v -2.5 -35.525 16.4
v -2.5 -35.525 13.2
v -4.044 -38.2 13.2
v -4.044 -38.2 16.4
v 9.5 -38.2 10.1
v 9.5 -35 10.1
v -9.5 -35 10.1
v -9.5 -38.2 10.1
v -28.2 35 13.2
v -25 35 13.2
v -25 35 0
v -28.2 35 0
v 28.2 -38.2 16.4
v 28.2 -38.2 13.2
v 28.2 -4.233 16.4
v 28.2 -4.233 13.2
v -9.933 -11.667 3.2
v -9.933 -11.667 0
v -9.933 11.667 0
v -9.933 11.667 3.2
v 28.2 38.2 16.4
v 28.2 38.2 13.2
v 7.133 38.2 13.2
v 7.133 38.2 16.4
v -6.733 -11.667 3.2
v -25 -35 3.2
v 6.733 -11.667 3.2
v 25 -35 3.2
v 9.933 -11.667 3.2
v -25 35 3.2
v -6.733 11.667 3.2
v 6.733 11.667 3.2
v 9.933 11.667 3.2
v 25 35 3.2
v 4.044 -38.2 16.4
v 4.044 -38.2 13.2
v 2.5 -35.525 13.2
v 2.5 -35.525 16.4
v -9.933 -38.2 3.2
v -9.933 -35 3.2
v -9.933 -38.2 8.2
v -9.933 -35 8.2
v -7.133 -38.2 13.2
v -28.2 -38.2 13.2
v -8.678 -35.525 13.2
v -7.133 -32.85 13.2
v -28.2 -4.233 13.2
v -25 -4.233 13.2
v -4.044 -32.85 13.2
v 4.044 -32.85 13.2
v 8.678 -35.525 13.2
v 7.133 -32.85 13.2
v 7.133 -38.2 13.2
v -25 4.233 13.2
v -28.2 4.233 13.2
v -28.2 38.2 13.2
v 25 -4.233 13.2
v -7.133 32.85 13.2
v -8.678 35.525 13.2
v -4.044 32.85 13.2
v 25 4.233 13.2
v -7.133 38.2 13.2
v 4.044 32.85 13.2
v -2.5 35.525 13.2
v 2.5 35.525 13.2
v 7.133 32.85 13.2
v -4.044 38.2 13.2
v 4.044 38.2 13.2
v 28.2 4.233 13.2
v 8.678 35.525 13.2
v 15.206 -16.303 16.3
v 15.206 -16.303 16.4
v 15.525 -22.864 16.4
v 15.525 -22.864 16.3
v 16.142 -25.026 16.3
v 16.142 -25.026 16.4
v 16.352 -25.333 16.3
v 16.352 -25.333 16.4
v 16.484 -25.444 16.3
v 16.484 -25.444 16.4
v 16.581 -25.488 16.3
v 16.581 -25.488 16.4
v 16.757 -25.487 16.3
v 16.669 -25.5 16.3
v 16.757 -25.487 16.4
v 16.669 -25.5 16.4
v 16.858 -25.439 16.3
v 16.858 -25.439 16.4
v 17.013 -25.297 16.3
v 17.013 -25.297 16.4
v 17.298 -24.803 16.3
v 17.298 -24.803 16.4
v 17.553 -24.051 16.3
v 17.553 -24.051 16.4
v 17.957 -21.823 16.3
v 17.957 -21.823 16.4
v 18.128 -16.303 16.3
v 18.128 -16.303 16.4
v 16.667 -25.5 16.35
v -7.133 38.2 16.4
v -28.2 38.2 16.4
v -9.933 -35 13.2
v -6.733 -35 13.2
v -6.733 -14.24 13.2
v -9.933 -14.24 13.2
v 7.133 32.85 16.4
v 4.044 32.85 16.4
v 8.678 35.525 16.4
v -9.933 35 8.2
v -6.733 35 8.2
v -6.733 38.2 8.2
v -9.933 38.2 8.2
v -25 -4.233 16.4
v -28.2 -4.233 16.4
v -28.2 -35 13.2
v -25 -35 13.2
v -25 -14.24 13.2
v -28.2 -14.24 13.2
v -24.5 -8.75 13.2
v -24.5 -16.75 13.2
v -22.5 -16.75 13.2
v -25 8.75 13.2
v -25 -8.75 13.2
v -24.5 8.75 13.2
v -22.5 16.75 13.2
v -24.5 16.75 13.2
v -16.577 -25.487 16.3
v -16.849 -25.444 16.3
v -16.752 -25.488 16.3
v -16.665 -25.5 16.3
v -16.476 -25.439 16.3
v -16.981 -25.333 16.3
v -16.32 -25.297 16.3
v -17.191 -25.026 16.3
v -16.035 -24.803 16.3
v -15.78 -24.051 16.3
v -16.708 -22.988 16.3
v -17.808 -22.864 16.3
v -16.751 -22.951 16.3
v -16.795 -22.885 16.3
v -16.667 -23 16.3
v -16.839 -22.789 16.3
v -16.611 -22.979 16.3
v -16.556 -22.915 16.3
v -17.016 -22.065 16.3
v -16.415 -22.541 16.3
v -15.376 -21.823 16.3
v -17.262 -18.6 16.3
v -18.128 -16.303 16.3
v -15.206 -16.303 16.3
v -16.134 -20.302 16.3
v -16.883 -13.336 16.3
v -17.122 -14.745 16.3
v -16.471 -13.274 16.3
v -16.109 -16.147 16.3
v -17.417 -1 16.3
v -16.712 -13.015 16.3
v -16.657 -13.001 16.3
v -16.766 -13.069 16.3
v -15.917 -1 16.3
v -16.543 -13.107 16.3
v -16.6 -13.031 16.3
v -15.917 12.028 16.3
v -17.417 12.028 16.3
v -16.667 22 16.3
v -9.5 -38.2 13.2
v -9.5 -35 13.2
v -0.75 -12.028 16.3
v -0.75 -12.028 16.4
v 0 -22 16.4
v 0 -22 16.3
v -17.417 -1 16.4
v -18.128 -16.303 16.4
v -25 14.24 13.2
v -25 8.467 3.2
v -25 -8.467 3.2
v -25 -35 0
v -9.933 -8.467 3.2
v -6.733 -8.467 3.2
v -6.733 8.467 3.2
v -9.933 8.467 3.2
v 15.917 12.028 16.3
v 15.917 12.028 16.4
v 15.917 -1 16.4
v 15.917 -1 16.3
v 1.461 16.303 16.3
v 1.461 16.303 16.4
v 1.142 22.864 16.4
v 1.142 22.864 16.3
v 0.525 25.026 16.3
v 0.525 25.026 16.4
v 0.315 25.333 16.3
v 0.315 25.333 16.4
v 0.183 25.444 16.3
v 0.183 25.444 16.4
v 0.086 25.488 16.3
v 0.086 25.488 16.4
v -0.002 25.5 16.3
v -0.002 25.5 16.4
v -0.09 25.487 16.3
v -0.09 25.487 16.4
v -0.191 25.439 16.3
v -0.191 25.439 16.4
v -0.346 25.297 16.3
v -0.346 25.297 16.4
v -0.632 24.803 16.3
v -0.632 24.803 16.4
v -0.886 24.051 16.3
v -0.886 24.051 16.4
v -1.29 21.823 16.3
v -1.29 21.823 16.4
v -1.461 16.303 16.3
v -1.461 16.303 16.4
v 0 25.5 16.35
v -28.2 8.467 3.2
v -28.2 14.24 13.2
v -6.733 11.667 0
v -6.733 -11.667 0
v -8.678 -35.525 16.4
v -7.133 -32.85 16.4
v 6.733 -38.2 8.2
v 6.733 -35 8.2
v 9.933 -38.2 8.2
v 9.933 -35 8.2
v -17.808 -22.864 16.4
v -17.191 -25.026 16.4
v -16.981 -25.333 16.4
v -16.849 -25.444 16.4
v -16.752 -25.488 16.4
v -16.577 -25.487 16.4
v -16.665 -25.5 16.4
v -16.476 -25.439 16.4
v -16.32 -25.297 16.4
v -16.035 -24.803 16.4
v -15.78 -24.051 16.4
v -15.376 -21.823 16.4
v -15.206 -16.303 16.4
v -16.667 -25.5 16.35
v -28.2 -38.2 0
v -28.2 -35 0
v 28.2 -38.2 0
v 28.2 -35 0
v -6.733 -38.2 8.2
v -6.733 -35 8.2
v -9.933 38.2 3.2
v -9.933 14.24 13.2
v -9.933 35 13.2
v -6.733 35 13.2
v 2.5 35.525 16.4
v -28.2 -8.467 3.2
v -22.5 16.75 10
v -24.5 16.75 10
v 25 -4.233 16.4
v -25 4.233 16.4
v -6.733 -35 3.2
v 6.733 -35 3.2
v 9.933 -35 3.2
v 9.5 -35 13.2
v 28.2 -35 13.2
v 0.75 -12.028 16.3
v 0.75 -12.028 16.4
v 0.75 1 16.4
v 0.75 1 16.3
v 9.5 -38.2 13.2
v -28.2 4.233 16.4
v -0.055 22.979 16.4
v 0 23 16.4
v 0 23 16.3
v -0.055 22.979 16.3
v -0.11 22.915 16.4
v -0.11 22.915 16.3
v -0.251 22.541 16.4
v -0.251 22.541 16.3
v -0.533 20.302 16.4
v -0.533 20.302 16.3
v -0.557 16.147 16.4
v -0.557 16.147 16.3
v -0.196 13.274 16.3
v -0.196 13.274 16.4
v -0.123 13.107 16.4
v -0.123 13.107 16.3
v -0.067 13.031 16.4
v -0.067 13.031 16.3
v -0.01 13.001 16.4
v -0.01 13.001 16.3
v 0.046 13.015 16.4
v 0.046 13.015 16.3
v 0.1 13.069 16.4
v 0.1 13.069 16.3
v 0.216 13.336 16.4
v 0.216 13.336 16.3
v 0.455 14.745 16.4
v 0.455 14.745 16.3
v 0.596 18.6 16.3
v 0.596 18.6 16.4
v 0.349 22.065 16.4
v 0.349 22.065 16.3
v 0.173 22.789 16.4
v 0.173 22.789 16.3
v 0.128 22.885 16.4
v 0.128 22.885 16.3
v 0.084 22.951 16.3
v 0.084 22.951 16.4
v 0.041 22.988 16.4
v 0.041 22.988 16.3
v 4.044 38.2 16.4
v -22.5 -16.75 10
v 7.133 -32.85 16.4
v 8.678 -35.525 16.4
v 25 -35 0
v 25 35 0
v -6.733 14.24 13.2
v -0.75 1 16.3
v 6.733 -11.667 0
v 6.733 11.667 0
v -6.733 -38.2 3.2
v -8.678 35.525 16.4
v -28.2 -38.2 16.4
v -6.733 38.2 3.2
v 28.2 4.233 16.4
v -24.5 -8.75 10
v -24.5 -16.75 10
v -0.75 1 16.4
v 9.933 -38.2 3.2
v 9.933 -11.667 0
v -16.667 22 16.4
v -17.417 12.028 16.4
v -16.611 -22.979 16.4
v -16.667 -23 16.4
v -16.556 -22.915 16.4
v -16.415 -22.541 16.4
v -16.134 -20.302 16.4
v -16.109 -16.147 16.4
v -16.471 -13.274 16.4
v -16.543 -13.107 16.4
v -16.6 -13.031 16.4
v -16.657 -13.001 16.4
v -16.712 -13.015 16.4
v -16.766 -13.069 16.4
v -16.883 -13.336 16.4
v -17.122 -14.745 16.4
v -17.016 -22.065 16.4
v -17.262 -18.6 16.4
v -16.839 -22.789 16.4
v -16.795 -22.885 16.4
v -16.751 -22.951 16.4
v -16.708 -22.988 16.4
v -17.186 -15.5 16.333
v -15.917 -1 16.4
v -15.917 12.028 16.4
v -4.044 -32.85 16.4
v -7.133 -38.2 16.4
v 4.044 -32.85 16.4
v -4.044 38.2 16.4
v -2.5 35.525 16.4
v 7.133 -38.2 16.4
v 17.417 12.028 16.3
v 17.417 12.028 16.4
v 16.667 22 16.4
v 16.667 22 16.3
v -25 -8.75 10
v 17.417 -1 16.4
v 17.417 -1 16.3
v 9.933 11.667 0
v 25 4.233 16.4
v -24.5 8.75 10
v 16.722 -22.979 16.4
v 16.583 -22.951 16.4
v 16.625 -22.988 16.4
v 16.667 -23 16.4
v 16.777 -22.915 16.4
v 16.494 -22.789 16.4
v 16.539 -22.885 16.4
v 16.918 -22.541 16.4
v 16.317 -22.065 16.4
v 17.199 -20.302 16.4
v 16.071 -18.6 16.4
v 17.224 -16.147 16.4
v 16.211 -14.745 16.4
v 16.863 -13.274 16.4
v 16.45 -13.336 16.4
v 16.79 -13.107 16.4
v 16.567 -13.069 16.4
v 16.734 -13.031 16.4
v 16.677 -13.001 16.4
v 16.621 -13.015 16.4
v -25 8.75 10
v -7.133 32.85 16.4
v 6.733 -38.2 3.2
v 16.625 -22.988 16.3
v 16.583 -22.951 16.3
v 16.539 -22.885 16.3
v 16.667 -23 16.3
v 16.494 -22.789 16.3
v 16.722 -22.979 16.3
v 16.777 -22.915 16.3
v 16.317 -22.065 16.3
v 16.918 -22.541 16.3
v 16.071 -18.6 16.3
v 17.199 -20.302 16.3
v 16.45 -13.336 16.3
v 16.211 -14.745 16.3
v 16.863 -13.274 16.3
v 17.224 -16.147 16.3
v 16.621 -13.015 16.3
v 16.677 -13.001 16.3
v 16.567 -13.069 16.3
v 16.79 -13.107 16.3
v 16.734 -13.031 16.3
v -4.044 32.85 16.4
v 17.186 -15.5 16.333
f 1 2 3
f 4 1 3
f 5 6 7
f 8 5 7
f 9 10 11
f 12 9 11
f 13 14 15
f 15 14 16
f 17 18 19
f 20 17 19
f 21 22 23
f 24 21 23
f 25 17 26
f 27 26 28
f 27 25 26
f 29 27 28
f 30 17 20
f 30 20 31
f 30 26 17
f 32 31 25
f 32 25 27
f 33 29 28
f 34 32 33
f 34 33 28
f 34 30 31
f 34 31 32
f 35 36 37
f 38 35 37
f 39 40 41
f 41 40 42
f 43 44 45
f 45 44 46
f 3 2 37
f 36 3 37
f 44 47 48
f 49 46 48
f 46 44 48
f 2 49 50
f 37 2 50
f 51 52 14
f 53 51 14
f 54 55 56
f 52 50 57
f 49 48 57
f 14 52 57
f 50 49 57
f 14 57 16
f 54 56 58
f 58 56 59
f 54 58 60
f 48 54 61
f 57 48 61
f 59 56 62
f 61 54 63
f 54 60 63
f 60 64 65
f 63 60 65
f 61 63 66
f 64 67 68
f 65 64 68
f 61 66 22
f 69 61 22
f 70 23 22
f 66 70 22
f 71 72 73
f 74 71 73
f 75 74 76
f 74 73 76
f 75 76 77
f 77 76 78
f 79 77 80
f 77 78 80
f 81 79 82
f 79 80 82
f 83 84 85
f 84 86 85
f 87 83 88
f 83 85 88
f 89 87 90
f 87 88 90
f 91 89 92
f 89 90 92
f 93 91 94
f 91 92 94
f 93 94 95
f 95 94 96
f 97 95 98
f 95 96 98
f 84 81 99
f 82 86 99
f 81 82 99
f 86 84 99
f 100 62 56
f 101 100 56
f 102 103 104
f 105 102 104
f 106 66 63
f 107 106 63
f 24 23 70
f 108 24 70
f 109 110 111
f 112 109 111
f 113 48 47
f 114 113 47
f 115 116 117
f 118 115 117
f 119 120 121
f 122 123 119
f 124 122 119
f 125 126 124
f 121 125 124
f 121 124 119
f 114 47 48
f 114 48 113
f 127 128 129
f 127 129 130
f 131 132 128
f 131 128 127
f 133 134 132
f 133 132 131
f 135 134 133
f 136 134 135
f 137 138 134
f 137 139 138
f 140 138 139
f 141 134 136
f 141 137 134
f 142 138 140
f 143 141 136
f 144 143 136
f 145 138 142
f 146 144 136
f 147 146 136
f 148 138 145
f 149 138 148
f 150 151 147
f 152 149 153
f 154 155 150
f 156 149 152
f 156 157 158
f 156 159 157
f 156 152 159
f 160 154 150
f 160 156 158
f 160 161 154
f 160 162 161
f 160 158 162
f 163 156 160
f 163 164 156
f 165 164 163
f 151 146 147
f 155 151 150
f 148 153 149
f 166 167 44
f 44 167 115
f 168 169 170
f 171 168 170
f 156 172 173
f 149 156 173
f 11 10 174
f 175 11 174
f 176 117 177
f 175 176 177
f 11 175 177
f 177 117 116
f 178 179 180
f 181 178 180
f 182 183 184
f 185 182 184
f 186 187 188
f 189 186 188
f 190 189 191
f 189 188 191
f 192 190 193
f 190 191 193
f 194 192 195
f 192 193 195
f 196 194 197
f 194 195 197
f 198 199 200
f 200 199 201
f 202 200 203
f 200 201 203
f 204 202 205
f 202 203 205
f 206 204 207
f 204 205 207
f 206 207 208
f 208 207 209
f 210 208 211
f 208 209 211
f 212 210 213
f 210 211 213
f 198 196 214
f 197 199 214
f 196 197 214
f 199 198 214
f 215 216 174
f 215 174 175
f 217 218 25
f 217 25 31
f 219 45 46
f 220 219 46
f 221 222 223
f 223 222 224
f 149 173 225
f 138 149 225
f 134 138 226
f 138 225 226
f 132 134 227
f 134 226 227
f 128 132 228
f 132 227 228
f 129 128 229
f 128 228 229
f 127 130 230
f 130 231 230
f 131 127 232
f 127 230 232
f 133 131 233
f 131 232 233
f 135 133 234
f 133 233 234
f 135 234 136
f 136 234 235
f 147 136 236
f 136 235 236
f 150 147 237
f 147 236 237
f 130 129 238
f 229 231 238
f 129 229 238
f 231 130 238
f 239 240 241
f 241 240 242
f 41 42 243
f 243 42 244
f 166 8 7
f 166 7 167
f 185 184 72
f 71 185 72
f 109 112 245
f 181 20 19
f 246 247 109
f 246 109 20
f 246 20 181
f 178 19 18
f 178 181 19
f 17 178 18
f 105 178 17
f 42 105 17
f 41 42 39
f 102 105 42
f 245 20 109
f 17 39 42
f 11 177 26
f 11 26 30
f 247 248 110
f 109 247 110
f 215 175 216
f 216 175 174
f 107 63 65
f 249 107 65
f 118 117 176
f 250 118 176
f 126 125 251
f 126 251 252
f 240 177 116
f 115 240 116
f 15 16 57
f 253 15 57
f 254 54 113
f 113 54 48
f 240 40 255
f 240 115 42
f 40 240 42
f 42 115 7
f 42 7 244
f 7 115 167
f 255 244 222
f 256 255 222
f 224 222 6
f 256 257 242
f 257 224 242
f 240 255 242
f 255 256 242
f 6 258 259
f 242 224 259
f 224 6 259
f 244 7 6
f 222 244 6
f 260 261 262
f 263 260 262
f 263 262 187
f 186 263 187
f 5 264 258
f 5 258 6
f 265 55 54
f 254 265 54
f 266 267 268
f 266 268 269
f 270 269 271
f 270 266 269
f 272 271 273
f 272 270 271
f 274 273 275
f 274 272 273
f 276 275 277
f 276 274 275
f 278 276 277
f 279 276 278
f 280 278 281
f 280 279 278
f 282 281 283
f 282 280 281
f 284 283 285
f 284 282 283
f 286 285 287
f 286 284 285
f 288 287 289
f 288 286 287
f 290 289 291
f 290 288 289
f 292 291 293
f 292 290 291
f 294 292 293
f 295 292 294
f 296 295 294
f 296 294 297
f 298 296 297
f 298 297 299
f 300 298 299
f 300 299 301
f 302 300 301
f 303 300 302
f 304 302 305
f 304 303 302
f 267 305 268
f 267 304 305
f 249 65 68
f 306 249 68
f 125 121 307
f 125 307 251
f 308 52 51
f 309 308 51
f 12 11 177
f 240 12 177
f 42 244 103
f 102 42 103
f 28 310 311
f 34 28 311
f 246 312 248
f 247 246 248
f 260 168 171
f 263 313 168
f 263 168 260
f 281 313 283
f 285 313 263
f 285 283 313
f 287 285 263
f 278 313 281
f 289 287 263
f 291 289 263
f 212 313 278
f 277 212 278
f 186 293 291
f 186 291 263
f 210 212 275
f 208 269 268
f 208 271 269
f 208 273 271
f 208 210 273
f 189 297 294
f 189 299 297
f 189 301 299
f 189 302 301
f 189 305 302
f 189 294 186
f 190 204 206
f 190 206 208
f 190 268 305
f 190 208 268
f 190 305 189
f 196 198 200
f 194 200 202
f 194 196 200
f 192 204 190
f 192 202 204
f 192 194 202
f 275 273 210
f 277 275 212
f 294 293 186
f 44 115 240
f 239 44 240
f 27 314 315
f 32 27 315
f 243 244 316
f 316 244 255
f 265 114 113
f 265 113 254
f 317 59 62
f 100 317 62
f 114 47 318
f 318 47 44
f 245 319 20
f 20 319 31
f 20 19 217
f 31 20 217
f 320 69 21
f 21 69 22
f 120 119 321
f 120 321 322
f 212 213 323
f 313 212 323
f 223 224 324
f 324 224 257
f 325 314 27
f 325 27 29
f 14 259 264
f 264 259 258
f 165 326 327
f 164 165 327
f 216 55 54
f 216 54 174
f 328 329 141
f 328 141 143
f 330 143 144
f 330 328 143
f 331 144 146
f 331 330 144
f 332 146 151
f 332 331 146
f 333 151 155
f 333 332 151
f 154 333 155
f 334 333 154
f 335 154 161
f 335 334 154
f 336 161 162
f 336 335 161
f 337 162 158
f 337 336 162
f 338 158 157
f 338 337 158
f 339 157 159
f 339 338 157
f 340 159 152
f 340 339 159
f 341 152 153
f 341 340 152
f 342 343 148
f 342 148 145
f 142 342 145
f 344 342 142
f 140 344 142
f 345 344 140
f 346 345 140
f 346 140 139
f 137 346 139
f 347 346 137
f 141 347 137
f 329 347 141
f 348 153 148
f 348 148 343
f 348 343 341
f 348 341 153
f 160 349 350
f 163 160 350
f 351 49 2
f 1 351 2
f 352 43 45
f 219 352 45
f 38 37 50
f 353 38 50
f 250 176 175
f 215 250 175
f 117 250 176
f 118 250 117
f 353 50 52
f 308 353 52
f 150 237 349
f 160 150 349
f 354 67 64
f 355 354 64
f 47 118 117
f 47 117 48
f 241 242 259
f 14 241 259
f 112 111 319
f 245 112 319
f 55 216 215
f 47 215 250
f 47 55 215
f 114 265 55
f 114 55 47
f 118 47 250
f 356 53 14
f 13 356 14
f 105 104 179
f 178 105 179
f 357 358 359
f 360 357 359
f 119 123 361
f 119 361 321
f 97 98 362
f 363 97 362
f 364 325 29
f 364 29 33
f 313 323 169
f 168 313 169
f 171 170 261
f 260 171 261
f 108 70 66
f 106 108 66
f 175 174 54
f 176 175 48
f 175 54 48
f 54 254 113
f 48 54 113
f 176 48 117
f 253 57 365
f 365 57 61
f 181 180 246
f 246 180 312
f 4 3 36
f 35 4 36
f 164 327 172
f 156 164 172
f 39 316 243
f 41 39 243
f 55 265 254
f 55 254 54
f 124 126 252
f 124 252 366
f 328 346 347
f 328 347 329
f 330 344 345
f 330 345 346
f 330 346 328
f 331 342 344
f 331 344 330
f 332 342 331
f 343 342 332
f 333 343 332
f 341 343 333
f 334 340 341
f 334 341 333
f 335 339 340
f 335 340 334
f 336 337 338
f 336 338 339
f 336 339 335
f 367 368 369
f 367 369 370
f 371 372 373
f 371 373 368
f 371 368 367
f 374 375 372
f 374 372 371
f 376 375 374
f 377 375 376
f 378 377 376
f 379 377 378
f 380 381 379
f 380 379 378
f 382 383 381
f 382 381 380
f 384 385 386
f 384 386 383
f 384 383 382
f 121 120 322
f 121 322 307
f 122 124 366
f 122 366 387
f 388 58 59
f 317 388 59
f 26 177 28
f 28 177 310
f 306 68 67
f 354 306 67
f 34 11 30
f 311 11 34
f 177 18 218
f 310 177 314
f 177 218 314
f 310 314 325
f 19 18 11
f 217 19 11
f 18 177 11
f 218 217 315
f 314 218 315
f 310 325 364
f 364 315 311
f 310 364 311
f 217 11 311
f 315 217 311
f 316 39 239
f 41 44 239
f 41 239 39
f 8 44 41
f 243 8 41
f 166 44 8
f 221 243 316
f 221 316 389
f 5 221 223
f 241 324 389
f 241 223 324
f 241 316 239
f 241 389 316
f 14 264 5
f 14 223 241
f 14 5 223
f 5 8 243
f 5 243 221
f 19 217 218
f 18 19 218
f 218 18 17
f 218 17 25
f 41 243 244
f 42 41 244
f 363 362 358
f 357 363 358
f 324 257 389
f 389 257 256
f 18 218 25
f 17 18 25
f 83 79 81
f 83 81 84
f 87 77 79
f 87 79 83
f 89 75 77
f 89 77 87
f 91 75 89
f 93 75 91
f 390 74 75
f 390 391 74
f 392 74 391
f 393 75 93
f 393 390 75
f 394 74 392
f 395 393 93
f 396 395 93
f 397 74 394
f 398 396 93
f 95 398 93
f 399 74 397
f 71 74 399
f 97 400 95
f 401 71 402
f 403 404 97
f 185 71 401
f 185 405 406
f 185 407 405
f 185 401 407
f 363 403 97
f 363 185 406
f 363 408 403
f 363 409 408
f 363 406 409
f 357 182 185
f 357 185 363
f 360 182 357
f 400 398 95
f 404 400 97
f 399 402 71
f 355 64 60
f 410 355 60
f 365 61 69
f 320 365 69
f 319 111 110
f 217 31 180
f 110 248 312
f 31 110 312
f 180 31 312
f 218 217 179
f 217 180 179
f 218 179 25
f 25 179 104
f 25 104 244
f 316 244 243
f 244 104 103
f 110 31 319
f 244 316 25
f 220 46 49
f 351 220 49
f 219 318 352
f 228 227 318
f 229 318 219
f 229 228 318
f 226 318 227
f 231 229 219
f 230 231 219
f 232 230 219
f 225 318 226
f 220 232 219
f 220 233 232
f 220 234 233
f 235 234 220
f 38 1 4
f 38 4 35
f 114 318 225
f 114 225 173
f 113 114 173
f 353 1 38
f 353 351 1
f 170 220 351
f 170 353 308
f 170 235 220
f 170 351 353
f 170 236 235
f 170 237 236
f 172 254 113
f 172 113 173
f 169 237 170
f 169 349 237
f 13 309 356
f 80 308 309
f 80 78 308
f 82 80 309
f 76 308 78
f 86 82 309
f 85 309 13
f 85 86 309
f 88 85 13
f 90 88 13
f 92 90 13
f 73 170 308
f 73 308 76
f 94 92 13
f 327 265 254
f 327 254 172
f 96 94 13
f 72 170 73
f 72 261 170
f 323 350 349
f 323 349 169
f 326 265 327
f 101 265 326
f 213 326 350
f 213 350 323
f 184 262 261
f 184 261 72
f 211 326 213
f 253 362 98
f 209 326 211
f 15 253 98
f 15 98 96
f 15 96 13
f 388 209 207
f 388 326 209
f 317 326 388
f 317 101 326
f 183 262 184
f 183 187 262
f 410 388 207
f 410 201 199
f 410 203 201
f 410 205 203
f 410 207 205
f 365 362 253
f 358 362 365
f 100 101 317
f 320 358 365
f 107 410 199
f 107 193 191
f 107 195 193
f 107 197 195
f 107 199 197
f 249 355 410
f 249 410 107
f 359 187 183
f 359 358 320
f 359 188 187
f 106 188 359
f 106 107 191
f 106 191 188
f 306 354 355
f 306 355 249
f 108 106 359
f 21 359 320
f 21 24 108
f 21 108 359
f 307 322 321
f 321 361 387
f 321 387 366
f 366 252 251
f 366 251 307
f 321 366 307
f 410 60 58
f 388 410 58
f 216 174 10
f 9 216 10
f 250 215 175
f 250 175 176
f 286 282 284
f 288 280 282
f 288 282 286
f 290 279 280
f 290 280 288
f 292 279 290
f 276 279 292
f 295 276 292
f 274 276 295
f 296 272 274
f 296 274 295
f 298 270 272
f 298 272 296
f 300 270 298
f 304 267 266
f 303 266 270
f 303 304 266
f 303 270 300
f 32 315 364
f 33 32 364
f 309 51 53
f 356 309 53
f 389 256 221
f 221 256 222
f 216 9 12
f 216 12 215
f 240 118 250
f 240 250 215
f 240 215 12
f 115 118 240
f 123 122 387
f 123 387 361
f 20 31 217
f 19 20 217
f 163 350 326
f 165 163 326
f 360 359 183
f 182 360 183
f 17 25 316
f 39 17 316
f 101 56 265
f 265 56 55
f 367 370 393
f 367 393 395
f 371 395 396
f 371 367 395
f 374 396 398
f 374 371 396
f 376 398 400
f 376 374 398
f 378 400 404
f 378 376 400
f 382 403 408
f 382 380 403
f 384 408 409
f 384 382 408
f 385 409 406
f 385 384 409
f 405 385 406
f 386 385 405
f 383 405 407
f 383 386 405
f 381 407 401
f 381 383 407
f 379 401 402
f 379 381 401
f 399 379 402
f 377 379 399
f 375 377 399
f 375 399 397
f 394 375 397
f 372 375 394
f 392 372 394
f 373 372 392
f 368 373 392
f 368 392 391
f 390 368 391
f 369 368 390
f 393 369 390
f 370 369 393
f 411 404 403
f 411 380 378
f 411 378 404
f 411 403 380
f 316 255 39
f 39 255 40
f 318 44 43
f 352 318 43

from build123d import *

# Parameters (mm, degrees)
F1_W      = 50
F1_H      = 70
F1_W_2    = 3.2
F1_H_2    = 23.3333333333
F2_DEPTH  = 3.2
F4_DEPTH  = 3.2
F6_DEPTH  = 3.2
F8_DEPTH  = 3.2
F10_DEPTH = 3.2
F11_W     = 18.7
F11_H     = 3.2
F12_DEPTH = 3.2
F14_DEPTH = 0.1
F16_DEPTH = 3.2


# Not quite as in the source:
# - a feature names something its author has since deleted; it is built from what else it names


with BuildPart() as f2:
    # F1 (on Top) → F2 (new body)
    with BuildSketch(Plane.XY):
        Rectangle(F1_W, F1_H)
        with Locations((-8.3333333333, 0)):
            Rectangle(F1_W_2, F1_H_2, mode=Mode.SUBTRACT)
        with Locations((8.3333333333, 0)):
            Rectangle(F1_W_2, F1_H_2, mode=Mode.SUBTRACT)
    extrude(amount=F2_DEPTH)


with BuildPart() as f4:
    # F3 (on face) → F4 (new body)
    with BuildSketch(Plane(origin=(-25, 0, 0), x_dir=(0, -1, 0), z_dir=(-1, 0, 0))):
        Polygon((-35, 13.2), (-35, 0), (35, 0), (35, 13.2), (14.2401693586, 13.2), (8.4666666667, 3.2), (-8.4666666667, 3.2), (-14.2401693586, 13.2), align=None)
    extrude(amount=F4_DEPTH)


with BuildPart() as f6:
    # F5 (on face) → F6 (new body)
    with BuildSketch(Plane(origin=(-6.7333333333, 0, 0), x_dir=(0, -1, 0), z_dir=(-1, 0, 0))):
        Polygon((38.2, 3.2), (38.2, 8.2), (35, 8.2), (35, 13.2), (14.2401693586, 13.2), (8.4666666667, 3.2), (11.6666666667, 3.2), (35, 3.2), align=None)
        Polygon((-8.4666666667, 3.2), (-14.2401693586, 13.2), (-35, 13.2), (-35, 8.2), (-38.2, 8.2), (-38.2, 3.2), (-35, 3.2), (-11.6666666667, 3.2), align=None)
        Polygon((11.6666666667, 0), (11.6666666667, 3.2), (8.4666666667, 3.2), (-8.4666666667, 3.2), (-11.6666666667, 3.2), (-11.6666666667, 0), align=None)
    extrude(amount=F6_DEPTH)


with BuildPart() as f8:
    # F7 (on face) → F8 (new body)
    with BuildSketch(Plane.XZ.offset(35)):
        Polygon((25, 3.2), (25, 0), (28.2, 0), (28.2, 13.2), (25, 13.2), align=None)
        Polygon((-25, 3.2), (-25, 0), (25, 0), (25, 3.2), (9.9333333333, 3.2), (6.7333333333, 3.2), (-6.7333333333, 3.2), (-9.9333333333, 3.2), align=None)
        Polygon((-28.2, 13.2), (-28.2, 0), (-25, 0), (-25, 3.2), (-9.9333333333, 3.2), (-9.9333333333, 8.2), (-6.7333333333, 8.2), (-6.7333333333, 3.2), (6.7333333333, 3.2), (6.7333333333, 8.2), (9.9333333333, 8.2), (9.9333333333, 3.2), (25, 3.2), (25, 13.2), (9.5, 13.2), (9.5, 10.1), (-9.5, 10.1), (-9.5, 13.2), align=None)
    extrude(amount=F8_DEPTH)


with BuildPart() as f10:
    # F9 (on face) → F10 (new body)
    with BuildSketch(Plane(origin=(-28.2, 0, 0), x_dir=(0, -1, 0), z_dir=(-1, 0, 0))):
        Polygon((-14.2401693586, 13.2), (-8.4666666667, 3.2), (8.4666666667, 3.2), (14.2401693586, 13.2), (4.2333333333, 13.2), (4.2333333333, 16.4), (-4.2333333333, 16.4), (-4.2333333333, 13.2), align=None)
    extrude(amount=-F10_DEPTH)


with BuildPart() as f12:
    # F11 (on face) → F12 (new body)
    with BuildSketch(Plane.XY.offset(13.2)):
        Polygon((-28.2, 38.2), (-28.2, 4.2333333333), (-25, 4.2333333333), (-25, -4.2333333333), (-28.2, -4.2333333333), (-28.2, -35), (-9.5, -35), (-9.5, -38.2), (-7.1332359102, -38.2), (-8.6776478803, -35.525), (-7.1332359102, -32.85), (-4.0444119701, -32.85), (-2.5, -35.525), (-4.0444119701, -38.2), (4.0444119701, -38.2), (2.5, -35.525), (4.0444119701, -32.85), (7.1332359102, -32.85), (8.6776478803, -35.525), (7.1332359102, -38.2), (9.5, -38.2), (9.5, -35), (28.2, -35), (28.2, -4.2333333333), (25, -4.2333333333), (25, 4.2333333333), (28.2, 4.2333333333), (28.2, 38.2), (7.1332359102, 38.2), (8.6776478803, 35.525), (7.1332359102, 32.85), (4.0444119701, 32.85), (2.5, 35.525), (4.0444119701, 38.2), (-4.0444119701, 38.2), (-2.5, 35.525), (-4.0444119701, 32.85), (-7.1332359102, 32.85), (-8.6776478803, 35.525), (-7.1332359102, 38.2), align=None)
        with Locations((-18.85, -36.6)):
            Rectangle(F11_W, F11_H)
        with Locations((18.85, -36.6)):
            Rectangle(F11_W, F11_H)
    extrude(amount=F12_DEPTH)

    # F13 (on face) → F14 (cut)
    with BuildSketch(Plane.XY.offset(16.4)):
        with BuildLine():
            add(Edge.make_bspline(
                [(-18.1277491736, -16.3026645297), (-18.5551299314, -25.5), (-16.6666666667, -25.5)],
                knots=[4.4840998278, 4.4840998278, 4.4840998278, 6.2831853072, 6.2831853072, 6.2831853072], degree=2, weights=[1, 0.6219680876, 1]))
            add(Edge.make_bspline(
                [(-16.6666666667, -25.5), (-14.7782034019, -25.5), (-15.2055841597, -16.3026645297)],
                knots=[0, 0, 0, 1.7990854794, 1.7990854794, 1.7990854794], degree=2, weights=[1, 0.6219680876, 1]))
            add(Edge.make_bspline(
                [(-15.2055841597, -16.3026645297), (-15.4752217273, -10.5), (-16.6666666667, -10.5), (-17.8581116061, -10.5), (-18.1277491736, -16.3026645297)],
                knots=[1.7990854794, 1.7990854794, 1.7990854794, 3.1415926536, 3.1415926536, 4.4840998278, 4.4840998278, 4.4840998278], degree=2, weights=[1, 0.7830425902, 1, 0.7830425902, 1]))
        make_face()
        with BuildLine():
            add(Edge.make_bspline(
                [(-16.6666666667, -23), (-15.6274361821, -23), (-16.1470514244, -15.5), (-16.6666666667, -8), (-17.1862819089, -15.5), (-17.7058971512, -23), (-16.6666666667, -23)],
                knots=[0, 0, 0, 2.0943951024, 2.0943951024, 4.1887902048, 4.1887902048, 6.2831853072, 6.2831853072, 6.2831853072], degree=2, weights=[1, 0.5, 1, 0.5, 1, 0.5, 1]))
        make_face(mode=Mode.SUBTRACT)
        with BuildLine():
            add(Edge.make_bspline(
                [(-15.2055841597, -16.3026645297), (-15.4752217273, -10.5), (-16.6666666667, -10.5), (-17.8581116061, -10.5), (-18.1277491736, -16.3026645297)],
                knots=[1.7990854794, 1.7990854794, 1.7990854794, 3.1415926536, 3.1415926536, 4.4840998278, 4.4840998278, 4.4840998278], degree=2, weights=[1, 0.7830425902, 1, 0.7830425902, 1]))
            Line((-15.2055841597, -16.3026645297), (-15.9166666667, -1))
            Line((-15.9166666667, -1), (-15.9166666667, 12.0281646624))
            Line((-15.9166666667, 12.0281646624), (-16.6666666667, 22))
            Line((-16.6666666667, 22), (-17.4166666667, 12.0281646624))
            Line((-17.4166666667, 12.0281646624), (-17.4166666667, -1))
            Line((-17.4166666667, -1), (-18.1277491736, -16.3026645297))
        make_face()
        with BuildLine():
            Line((-1.4610825069, 16.3026645297), (-0.75, 1))
            Line((-0.75, 1), (-0.75, -12.0281646624))
            Line((-0.75, -12.0281646624), (0, -22))
            Line((0, -22), (0.75, -12.0281646624))
            Line((0.75, -12.0281646624), (0.75, 1))
            Line((0.75, 1), (1.4610825069, 16.3026645297))
            add(Edge.make_bspline(
                [(-1.4610825069, 16.3026645297), (-1.1914449394, 10.5), (0, 10.5), (1.1914449394, 10.5), (1.4610825069, 16.3026645297)],
                knots=[1.7990854794, 1.7990854794, 1.7990854794, 3.1415926536, 3.1415926536, 4.4840998278, 4.4840998278, 4.4840998278], degree=2, weights=[1, 0.7830425902, 1, 0.7830425902, 1]))
        make_face()
        with BuildLine():
            add(Edge.make_bspline(
                [(0, 25.5), (-1.8884632647, 25.5), (-1.4610825069, 16.3026645297)],
                knots=[0, 0, 0, 1.7990854794, 1.7990854794, 1.7990854794], degree=2, weights=[1, 0.6219680876, 1]))
            add(Edge.make_bspline(
                [(-1.4610825069, 16.3026645297), (-1.1914449394, 10.5), (0, 10.5), (1.1914449394, 10.5), (1.4610825069, 16.3026645297)],
                knots=[1.7990854794, 1.7990854794, 1.7990854794, 3.1415926536, 3.1415926536, 4.4840998278, 4.4840998278, 4.4840998278], degree=2, weights=[1, 0.7830425902, 1, 0.7830425902, 1]))
            add(Edge.make_bspline(
                [(1.4610825069, 16.3026645297), (1.8884632647, 25.5), (0, 25.5)],
                knots=[4.4840998278, 4.4840998278, 4.4840998278, 6.2831853072, 6.2831853072, 6.2831853072], degree=2, weights=[1, 0.6219680876, 1]))
        make_face()
        with BuildLine():
            add(Edge.make_bspline(
                [(0, 23), (-1.0392304845, 23), (-0.5196152423, 15.5), (0, 8), (0.5196152423, 15.5), (1.0392304845, 23), (0, 23)],
                knots=[0, 0, 0, 2.0943951024, 2.0943951024, 4.1887902048, 4.1887902048, 6.2831853072, 6.2831853072, 6.2831853072], degree=2, weights=[1, 0.5, 1, 0.5, 1, 0.5, 1]))
        make_face(mode=Mode.SUBTRACT)
        with BuildLine():
            Line((18.1277491736, -16.3026645297), (17.4166666667, -1))
            Line((17.4166666667, -1), (17.4166666667, 12.0281646624))
            Line((17.4166666667, 12.0281646624), (16.6666666667, 22))
            Line((16.6666666667, 22), (15.9166666667, 12.0281646624))
            Line((15.9166666667, 12.0281646624), (15.9166666667, -1))
            Line((15.9166666667, -1), (15.2055841597, -16.3026645297))
            add(Edge.make_bspline(
                [(18.1277491736, -16.3026645297), (17.8581116061, -10.5), (16.6666666667, -10.5), (15.4752217273, -10.5), (15.2055841597, -16.3026645297)],
                knots=[1.7990854794, 1.7990854794, 1.7990854794, 3.1415926536, 3.1415926536, 4.4840998278, 4.4840998278, 4.4840998278], degree=2, weights=[1, 0.7830425902, 1, 0.7830425902, 1]))
        make_face()
        with BuildLine():
            add(Edge.make_bspline(
                [(16.6666666667, -25.5), (18.5551299314, -25.5), (18.1277491736, -16.3026645297)],
                knots=[0, 0, 0, 1.7990854794, 1.7990854794, 1.7990854794], degree=2, weights=[1, 0.6219680876, 1]))
            add(Edge.make_bspline(
                [(18.1277491736, -16.3026645297), (17.8581116061, -10.5), (16.6666666667, -10.5), (15.4752217273, -10.5), (15.2055841597, -16.3026645297)],
                knots=[1.7990854794, 1.7990854794, 1.7990854794, 3.1415926536, 3.1415926536, 4.4840998278, 4.4840998278, 4.4840998278], degree=2, weights=[1, 0.7830425902, 1, 0.7830425902, 1]))
            add(Edge.make_bspline(
                [(15.2055841597, -16.3026645297), (14.7782034019, -25.5), (16.6666666667, -25.5)],
                knots=[4.4840998278, 4.4840998278, 4.4840998278, 6.2831853072, 6.2831853072, 6.2831853072], degree=2, weights=[1, 0.6219680876, 1]))
        make_face()
        with BuildLine():
            add(Edge.make_bspline(
                [(16.6666666667, -23), (17.7058971512, -23), (17.1862819089, -15.5), (16.6666666667, -8), (16.1470514244, -15.5), (15.6274361821, -23), (16.6666666667, -23)],
                knots=[0, 0, 0, 2.0943951024, 2.0943951024, 4.1887902048, 4.1887902048, 6.2831853072, 6.2831853072, 6.2831853072], degree=2, weights=[1, 0.5, 1, 0.5, 1, 0.5, 1]))
        make_face(mode=Mode.SUBTRACT)
    extrude(amount=-F14_DEPTH, mode=Mode.SUBTRACT)


with BuildPart() as f16:
    # F15 (on face) → F16 (new body)
    with BuildSketch(Plane.XY.offset(13.2)):
        Polygon((-22.5, 16.75), (-24.5, 16.75), (-24.5, 8.75), (-25, 8.75), (-25, -8.75), (-24.5, -8.75), (-24.5, -16.75), (-22.5, -16.75), align=None)
    extrude(amount=-F16_DEPTH)


solid = Compound([f2.part, f4.part, f6.part, f8.part, f10.part, f12.part, f16.part])
